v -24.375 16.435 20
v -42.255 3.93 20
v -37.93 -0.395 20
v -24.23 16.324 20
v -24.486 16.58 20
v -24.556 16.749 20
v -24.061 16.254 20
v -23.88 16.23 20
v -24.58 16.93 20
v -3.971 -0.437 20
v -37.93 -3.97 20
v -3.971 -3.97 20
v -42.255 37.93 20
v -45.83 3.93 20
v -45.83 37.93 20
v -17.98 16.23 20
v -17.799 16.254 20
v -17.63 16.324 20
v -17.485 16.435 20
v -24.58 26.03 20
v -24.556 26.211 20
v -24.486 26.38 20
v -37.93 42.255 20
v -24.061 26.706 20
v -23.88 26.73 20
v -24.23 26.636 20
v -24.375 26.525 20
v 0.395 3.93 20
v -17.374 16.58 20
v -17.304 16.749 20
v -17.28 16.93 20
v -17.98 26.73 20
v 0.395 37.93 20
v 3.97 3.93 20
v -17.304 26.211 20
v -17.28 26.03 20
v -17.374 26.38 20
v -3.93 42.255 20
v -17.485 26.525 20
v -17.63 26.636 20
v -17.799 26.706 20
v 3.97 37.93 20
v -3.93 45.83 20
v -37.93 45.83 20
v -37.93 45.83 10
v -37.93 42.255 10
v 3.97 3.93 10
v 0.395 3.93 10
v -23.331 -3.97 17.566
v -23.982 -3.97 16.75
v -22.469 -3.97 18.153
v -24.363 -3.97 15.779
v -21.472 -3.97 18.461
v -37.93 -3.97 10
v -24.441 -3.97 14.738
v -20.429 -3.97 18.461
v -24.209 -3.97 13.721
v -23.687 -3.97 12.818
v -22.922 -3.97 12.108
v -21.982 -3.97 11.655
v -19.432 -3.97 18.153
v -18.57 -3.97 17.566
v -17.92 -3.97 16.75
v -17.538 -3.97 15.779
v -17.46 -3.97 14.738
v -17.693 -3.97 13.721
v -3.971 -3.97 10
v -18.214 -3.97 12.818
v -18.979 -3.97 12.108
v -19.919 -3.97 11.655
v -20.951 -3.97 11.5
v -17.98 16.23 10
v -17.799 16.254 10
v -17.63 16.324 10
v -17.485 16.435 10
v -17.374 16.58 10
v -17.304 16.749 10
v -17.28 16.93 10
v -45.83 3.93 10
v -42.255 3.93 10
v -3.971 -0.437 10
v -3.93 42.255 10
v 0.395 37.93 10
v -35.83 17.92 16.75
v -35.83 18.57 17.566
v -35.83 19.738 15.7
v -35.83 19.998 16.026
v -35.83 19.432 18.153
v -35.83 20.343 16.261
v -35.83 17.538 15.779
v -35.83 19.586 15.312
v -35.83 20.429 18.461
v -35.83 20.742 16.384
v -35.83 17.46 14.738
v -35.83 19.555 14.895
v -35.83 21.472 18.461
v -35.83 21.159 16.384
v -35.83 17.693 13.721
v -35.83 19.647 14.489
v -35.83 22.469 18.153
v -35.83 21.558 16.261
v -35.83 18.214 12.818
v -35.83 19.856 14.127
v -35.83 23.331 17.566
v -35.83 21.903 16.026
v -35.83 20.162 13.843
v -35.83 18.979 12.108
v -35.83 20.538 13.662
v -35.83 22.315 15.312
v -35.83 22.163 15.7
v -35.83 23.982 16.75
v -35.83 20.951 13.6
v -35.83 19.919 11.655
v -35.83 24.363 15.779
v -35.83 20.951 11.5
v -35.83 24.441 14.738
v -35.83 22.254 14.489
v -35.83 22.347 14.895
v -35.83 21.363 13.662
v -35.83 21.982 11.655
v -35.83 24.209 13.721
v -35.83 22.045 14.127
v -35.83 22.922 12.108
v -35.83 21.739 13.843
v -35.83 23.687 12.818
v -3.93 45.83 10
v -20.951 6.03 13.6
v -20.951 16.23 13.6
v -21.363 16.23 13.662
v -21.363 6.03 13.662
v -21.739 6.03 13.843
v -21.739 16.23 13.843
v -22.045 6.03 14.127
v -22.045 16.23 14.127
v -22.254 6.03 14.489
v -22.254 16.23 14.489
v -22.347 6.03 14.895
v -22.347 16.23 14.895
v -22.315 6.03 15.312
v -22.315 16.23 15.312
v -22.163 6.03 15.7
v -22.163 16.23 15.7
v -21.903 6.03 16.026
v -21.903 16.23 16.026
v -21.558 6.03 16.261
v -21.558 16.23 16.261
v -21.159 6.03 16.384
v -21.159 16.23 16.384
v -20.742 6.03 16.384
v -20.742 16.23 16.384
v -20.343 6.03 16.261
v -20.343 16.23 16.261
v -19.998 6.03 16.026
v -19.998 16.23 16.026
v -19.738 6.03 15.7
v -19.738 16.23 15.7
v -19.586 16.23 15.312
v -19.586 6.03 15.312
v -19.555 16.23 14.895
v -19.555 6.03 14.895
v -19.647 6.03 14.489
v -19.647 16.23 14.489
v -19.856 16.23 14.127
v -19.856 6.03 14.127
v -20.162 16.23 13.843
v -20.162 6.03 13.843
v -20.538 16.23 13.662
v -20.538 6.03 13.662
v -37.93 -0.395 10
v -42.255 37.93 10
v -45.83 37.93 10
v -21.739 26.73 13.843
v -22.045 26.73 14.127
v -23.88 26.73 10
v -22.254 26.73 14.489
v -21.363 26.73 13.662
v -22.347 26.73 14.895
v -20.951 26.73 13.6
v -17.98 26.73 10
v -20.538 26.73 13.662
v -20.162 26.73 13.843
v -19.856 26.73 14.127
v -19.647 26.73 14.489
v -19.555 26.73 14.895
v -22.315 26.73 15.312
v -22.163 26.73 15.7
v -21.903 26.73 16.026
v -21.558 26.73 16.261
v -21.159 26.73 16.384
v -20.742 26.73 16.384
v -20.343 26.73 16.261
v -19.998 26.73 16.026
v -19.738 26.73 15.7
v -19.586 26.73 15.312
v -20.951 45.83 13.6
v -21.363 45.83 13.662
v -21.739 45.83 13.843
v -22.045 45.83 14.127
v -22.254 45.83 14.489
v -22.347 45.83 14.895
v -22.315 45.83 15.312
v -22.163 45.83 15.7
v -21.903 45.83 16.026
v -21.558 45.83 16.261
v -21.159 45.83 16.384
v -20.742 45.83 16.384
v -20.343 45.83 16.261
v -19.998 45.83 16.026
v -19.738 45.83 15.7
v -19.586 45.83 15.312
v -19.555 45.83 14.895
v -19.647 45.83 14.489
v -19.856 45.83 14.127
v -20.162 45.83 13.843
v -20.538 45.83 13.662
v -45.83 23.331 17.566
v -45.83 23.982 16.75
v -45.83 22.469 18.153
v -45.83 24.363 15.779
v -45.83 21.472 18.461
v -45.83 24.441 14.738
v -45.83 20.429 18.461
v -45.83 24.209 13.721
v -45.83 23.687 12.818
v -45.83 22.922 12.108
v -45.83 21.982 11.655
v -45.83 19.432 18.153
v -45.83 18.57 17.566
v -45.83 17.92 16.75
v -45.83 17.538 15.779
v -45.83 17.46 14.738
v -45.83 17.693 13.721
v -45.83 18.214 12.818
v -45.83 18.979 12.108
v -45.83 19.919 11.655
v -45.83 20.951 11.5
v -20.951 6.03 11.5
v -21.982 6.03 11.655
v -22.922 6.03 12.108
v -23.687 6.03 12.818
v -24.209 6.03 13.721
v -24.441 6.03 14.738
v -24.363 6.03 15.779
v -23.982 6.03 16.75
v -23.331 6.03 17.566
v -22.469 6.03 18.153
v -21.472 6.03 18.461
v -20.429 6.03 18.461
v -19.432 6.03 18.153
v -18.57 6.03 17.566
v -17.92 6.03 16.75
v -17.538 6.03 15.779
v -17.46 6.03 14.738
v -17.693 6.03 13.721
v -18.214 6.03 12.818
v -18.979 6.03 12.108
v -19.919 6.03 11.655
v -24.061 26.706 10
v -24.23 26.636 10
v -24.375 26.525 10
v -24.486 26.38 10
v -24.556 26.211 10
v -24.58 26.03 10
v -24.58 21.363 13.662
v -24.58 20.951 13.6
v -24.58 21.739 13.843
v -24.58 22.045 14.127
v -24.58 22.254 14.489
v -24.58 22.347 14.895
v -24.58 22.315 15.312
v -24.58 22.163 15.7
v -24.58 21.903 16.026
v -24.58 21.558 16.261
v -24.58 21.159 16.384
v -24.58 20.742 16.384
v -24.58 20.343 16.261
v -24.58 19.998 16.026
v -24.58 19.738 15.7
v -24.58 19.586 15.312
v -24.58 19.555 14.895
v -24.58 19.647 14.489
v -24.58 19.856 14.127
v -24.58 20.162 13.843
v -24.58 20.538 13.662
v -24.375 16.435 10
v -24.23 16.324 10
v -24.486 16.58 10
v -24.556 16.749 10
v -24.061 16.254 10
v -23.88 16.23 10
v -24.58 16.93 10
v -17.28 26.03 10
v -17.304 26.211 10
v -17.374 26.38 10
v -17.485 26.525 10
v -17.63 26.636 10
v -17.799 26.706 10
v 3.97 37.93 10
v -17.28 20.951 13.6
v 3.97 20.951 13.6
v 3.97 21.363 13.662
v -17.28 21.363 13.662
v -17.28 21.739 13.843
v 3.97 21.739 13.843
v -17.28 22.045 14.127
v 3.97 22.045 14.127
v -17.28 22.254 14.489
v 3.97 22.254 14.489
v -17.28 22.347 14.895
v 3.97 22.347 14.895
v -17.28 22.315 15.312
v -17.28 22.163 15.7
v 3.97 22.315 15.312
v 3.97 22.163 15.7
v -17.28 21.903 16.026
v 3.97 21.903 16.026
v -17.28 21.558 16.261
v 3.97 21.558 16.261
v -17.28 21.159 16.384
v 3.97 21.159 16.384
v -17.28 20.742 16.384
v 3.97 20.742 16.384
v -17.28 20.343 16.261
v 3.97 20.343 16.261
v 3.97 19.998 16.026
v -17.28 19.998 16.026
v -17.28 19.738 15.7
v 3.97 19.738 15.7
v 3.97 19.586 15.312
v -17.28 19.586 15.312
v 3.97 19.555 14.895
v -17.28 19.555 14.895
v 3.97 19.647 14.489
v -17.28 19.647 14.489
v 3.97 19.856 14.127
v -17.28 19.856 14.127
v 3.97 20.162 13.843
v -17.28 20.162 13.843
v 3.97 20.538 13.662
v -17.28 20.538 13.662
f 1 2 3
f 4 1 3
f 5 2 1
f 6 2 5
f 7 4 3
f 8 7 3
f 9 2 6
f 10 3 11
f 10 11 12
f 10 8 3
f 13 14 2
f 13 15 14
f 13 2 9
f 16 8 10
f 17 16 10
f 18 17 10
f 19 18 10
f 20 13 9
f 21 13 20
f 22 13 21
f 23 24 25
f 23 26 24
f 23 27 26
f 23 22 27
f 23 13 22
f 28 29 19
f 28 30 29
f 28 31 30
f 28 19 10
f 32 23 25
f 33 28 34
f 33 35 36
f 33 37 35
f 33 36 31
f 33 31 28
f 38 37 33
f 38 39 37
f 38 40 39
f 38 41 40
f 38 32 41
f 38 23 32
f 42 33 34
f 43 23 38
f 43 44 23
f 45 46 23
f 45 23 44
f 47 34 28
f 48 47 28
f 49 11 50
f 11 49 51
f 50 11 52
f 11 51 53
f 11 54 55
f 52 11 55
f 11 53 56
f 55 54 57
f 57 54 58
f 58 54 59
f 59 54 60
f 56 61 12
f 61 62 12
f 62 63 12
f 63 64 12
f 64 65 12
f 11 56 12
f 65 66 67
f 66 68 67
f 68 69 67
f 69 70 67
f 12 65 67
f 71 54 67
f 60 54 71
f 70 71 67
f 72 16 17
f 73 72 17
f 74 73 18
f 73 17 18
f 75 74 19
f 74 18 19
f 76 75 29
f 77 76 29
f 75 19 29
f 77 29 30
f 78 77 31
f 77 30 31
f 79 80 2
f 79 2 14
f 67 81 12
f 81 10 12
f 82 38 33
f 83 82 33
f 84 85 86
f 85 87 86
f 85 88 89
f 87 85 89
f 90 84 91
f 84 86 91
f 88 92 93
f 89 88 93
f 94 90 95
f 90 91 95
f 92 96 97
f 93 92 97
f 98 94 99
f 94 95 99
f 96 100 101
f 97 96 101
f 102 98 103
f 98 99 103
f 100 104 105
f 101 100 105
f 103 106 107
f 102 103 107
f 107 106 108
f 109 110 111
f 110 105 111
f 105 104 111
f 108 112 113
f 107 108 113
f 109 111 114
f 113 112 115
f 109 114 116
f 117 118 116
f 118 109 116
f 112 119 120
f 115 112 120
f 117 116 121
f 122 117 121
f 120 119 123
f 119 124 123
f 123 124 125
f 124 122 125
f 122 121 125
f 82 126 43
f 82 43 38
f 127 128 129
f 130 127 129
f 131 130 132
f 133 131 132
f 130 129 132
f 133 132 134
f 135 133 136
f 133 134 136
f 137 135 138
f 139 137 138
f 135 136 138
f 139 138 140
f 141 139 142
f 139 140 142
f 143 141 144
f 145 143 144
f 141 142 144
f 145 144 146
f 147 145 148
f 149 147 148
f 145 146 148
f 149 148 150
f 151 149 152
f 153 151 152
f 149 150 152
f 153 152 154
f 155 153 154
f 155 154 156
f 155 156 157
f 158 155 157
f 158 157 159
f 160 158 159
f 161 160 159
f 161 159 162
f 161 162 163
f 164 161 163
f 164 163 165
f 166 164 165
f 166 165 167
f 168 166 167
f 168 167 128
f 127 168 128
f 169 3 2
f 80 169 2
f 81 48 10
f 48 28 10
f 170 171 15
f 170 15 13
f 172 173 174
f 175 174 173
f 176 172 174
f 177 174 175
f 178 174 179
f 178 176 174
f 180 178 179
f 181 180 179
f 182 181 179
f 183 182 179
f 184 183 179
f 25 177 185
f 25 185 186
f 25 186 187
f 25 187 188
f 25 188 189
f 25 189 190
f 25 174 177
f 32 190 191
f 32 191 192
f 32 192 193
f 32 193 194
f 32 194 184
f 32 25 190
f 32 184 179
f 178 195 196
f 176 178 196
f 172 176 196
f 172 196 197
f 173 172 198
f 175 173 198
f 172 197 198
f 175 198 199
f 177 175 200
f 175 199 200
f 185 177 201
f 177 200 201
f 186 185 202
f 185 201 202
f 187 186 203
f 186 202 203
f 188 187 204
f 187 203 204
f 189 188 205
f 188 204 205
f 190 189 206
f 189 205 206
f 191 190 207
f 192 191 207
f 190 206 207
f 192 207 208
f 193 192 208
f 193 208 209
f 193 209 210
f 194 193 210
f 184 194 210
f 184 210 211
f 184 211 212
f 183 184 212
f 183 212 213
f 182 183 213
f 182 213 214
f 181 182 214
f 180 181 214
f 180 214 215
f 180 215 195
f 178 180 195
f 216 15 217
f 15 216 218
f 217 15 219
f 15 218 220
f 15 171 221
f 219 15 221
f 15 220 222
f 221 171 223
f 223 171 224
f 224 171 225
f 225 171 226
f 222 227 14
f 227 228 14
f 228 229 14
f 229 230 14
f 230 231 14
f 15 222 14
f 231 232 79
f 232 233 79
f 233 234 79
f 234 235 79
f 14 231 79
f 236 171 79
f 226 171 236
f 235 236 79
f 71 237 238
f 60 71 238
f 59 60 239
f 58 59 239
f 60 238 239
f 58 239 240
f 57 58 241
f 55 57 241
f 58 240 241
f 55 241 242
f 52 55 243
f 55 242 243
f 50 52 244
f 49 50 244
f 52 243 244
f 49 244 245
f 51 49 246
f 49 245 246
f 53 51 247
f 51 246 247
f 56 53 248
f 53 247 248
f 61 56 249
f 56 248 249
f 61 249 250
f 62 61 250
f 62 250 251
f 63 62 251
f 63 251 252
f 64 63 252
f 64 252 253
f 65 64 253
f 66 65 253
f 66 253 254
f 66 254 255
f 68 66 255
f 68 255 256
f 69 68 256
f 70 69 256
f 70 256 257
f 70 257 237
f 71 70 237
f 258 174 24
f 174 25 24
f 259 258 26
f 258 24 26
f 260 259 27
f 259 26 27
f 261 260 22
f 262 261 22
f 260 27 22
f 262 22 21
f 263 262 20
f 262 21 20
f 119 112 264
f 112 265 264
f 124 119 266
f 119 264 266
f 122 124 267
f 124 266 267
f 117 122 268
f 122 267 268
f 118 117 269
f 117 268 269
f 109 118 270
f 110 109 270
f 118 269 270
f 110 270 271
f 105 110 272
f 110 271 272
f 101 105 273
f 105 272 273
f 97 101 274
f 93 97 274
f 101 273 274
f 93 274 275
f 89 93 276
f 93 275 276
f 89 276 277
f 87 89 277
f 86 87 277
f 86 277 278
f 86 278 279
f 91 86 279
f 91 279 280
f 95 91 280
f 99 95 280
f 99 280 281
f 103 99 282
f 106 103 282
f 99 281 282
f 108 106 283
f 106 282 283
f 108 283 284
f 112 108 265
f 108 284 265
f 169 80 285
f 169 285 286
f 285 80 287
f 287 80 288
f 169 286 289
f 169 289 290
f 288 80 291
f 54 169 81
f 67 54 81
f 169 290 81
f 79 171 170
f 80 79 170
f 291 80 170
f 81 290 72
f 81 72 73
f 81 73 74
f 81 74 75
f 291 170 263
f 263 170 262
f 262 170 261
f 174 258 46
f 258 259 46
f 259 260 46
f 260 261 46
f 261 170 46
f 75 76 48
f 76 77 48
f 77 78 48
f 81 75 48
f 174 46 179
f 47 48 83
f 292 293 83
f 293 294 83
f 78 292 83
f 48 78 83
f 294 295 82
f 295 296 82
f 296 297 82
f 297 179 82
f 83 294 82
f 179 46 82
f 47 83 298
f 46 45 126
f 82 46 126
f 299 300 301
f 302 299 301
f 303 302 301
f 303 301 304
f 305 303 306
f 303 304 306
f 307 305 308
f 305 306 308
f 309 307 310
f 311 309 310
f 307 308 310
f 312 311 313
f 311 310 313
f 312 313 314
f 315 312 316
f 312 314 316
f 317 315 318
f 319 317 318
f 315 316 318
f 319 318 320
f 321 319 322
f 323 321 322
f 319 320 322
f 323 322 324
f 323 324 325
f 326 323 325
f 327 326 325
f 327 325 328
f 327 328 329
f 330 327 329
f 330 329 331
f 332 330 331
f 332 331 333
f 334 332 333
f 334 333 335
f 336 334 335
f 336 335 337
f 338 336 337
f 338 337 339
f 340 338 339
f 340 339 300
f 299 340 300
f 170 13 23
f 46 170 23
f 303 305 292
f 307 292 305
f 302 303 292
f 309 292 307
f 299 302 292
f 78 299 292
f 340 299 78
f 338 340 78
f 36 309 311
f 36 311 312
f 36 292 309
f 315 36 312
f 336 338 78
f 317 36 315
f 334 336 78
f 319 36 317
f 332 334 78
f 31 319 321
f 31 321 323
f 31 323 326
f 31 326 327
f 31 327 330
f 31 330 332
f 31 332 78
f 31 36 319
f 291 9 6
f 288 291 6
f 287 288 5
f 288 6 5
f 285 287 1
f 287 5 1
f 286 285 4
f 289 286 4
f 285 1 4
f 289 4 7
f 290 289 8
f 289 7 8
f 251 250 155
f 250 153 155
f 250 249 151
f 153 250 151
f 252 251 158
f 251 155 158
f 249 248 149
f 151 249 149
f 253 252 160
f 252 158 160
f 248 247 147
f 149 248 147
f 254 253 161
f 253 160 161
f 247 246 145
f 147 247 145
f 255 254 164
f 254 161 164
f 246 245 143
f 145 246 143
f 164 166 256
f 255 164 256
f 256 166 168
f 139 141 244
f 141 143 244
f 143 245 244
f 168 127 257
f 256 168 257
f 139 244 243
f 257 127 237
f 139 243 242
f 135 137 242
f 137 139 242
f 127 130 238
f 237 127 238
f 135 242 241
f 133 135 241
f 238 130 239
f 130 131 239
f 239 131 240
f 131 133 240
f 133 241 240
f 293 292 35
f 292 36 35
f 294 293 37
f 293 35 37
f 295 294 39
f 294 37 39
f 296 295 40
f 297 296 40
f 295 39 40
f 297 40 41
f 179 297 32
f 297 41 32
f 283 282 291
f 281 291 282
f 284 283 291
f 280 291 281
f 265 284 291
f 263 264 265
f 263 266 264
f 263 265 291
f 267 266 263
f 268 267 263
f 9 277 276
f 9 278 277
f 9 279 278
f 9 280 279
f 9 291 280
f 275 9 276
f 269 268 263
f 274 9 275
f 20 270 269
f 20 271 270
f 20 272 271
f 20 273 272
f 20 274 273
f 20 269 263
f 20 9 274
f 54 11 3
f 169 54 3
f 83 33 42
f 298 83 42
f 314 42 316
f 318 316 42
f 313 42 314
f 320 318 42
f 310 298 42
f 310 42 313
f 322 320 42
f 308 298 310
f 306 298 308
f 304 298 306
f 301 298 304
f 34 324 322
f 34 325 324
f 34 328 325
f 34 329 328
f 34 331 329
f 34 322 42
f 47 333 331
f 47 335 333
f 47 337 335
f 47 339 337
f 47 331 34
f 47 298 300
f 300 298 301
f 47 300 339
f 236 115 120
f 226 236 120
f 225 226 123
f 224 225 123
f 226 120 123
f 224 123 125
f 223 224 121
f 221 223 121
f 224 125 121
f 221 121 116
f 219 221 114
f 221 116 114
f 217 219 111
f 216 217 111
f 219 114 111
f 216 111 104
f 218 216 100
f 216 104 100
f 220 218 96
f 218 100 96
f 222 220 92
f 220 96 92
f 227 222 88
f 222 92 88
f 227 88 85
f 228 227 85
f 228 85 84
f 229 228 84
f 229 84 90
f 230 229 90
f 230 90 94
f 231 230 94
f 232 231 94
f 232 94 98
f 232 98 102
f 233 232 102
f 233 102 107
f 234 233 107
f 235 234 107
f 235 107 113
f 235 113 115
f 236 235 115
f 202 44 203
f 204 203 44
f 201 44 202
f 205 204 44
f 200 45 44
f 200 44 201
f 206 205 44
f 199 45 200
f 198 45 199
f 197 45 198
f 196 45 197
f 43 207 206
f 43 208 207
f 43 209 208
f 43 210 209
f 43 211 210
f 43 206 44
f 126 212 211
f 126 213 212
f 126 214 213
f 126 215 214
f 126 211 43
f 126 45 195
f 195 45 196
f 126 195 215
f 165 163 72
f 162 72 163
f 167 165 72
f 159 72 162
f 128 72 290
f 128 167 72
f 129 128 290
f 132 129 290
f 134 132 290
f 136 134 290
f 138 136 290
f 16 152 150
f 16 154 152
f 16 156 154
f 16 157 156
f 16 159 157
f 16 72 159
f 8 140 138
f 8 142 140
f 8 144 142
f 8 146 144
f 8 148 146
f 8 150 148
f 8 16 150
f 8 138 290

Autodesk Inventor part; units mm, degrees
ref_plane "YZ Plane" through (0, 0, 0) normal (1, 0, 0) x (0, 1, 0)
ref_plane "XZ Plane" through (0, 0, 0) normal (0, 1, 0) x (-1, 0, 0)
ref_plane "Work Plane1" through (0, 0, 10) normal (0, 0, 1) x (1, 0, 0)
sketch "Sketch1" plane through (0, 0, 10) normal (0, 0, 1) x (1, 0, 0)
  line L0 (-4.0299, -0.3538) -> (-2.2322, 1.4439) construction
  arc A0 (-1.4439, 2.2322) -> (-2.2322, 1.4439) centre (-0.9299, 0.9299) ccw construction
  line L1 (-1.4439, 2.2322) -> (0.3538, 4.0299) construction
  line L2 (-37.8299, 42.8299) -> (-37.8299, 37.8299) construction
  line L3 (-37.8299, 37.8299) -> (-42.9208, 37.8299) construction
  line L4 (-37.8299, 42.2137) -> (-37.8299, 45.8299) construction
  line L5 (-37.8299, 45.8299) -> (-4.0299, 45.8299) construction
  line L6 (-4.0299, 45.8299) -> (-4.0299, 42.2137) construction
  line L7 (-4.0299, 4.0299) -> (0.3538, 4.0299) projected
  circle A1 centre (-20.9299, 20.9299) radius 17.5 projected
  line L8 (-20.9299, 58.9723) -> (17.1124, 20.9299) construction
  line L9 (17.1124, 20.9299) -> (-20.9299, -17.1124) construction
  line L10 (-20.9299, -17.1124) -> (-58.9723, 20.9299) construction
  line L11 (-58.9723, 20.9299) -> (-20.9299, 58.9723) construction
  line L12 (-20.9299, 58.9723) -> (-20.9299, -17.1124) construction
  line L13 (17.1124, 20.9299) -> (-58.9723, 20.9299) construction
  line L14 (-20.9299, 58.9723) -> (32.8701, 58.9723) construction
  line L15 (-43.4299, 43.4299) -> (1.5701, 43.4299) construction
  line L16 (1.5701, 43.4299) -> (1.5701, -1.5701) construction
  line L17 (1.5701, -1.5701) -> (-43.4299, -1.5701) construction
  line L18 (-43.4299, -1.5701) -> (-43.4299, 43.4299) construction
  line L19 (-43.4299, 43.4299) -> (1.5701, -1.5701) construction
  line L20 (1.5701, 43.4299) -> (-43.4299, -1.5701) construction
  line L21 (-43.4299, 5.3876) -> (-43.4299, 36.4723)
  line L22 (-43.4299, 36.4723) -> (-36.4723, 43.4299)
  line L23 (-36.4723, 43.4299) -> (-5.3876, 43.4299)
  line L24 (-5.3876, 43.4299) -> (1.5701, 36.4723)
  line L25 (1.5701, 36.4723) -> (1.5701, 5.3876)
  line L26 (1.5701, 5.3876) -> (-5.3876, -1.5701)
  line L27 (-5.3876, -1.5701) -> (-36.4723, -1.5701)
  line L28 (-36.4723, -1.5701) -> (-43.4299, 5.3876)
  line L29 (-4.0299, 42.2137) -> (-37.8299, 42.2137) projected
  line L30 (-4.0299, -0.3538) -> (-4.0299, 4.0299) projected
  circle A2 centre (-20.9299, 20.9299) radius 1.5
  line L31 (-10.9299, 10.9299) -> (-30.9299, 10.9299) construction
  line L32 (-30.9299, 10.9299) -> (-30.9299, 30.9299) construction
  line L33 (-30.9299, 30.9299) -> (-10.9299, 30.9299) construction
  line L34 (-10.9299, 30.9299) -> (-10.9299, 10.9299) construction
  line L35 (-10.9299, 10.9299) -> (-30.9299, 30.9299) construction
  line L36 (-30.9299, 10.9299) -> (-10.9299, 30.9299) construction
  circle A3 centre (-30.9299, 30.9299) radius 1.4
  circle A4 centre (-30.9299, 10.9299) radius 1.4
  circle A5 centre (-10.9299, 10.9299) radius 1.4
  line L37 (-45.8299, 37.8299) -> (-42.0723, 37.8299) construction
  line L38 (-42.1723, 37.7299) -> (-45.8299, 37.7299)
  line L39 (-45.8299, 37.7299) -> (-45.8299, 4.1299)
  line L40 (-45.8299, 4.1299) -> (-42.1723, 4.1299)
  line L41 (-42.1723, 4.1299) -> (-42.1723, 37.7299)
  line L42 (-45.8299, 4.0299) -> (-42.0723, 4.0299) construction
  line L43 (-45.8299, 37.8299) -> (-42.0723, 37.8299) projected
  line L44 (-37.7299, 45.8299) -> (-4.1299, 45.8299)
  line L45 (-4.1299, 45.8299) -> (-4.1299, 42.1723)
  line L46 (-4.1299, 42.1723) -> (-37.7299, 42.1723)
  line L47 (-37.7299, 42.1723) -> (-37.7299, 45.8299)
  line L48 (0.4701, 37.8299) -> (0.4701, 4.0299) construction
  line L49 (0.4701, 4.0299) -> (3.9701, 4.0299) construction
  line L50 (3.9701, 37.8299) -> (3.9701, 4.0299) construction
  line L51 (0.4701, 37.8299) -> (3.9701, 37.8299) construction
  line L52 (-45.8299, -3.9701) -> (-4.0299, -3.9701) construction
  line L53 (0.3124, 37.7299) -> (3.9701, 37.7299)
  line L54 (3.9701, 37.7299) -> (3.9701, 4.1299)
  line L55 (3.9701, 4.1299) -> (0.3124, 4.1299)
  line L56 (0.3124, 4.1299) -> (0.3124, 37.7299)
  line L57 (-4.1713, -0.3538) -> (-37.7299, -0.3538)
  line L58 (-37.7299, -0.3538) -> (-37.7299, -3.9701)
  line L59 (-37.7299, -3.9701) -> (-4.1713, -3.9701)
  line L60 (-4.1713, -3.9701) -> (-4.1713, -0.3538)
  point P0 (-37.8299, 4.0299)
  dimension "d18" = 53.8
  dimension "d19" = 45
  dimension "d20" = 53.8
  dimension "d21" = 45
  dimension "d22" = 45
  dimension "d30" = 20
  dimension "d31" = 20
  dimension "d32" = 2.8
  dimension "d33" = 2.8
  dimension "d34" = 2.8
  dimension "d35" = 3
  dimension "d36" = 0.1
  dimension "d37" = 0.1
  dimension "d38" = 0.1
  dimension "d39" = 0.1
extrude "Extrusion1" add sketch "Sketch1" along normal blind 10 contours L30 L26 L57 L28 L41 L22 L46 L24 L56 L7 | L7 L26 L30 | L56 L24 L25 L26 | L26 L25 L24 L53 L54 L55 | L60 L59 L58 L57 L28 L27 L26 | L26 L27 L28 L57 | L46 L22 L29 L24 | L24 L29 L45 | L40 L39 L38 L22 L21 L28 | L28 L21 L22 L41 | L29 L22 L23 L24 | L24 L23 L22 L29 L47 L44 L45 | L47 L29 L22 | A1 | A2 | A3 | A4 | A5
sketch "Skizze4" plane through (0, 0, 20) normal (0, 0, 1) x (1, 0, 0)
  line L0 (-37.7299, 42.1723) -> (-42.1723, 37.7299) projected
  line L1 (-42.1723, 37.7299) -> (-45.8299, 37.7299) projected
  line L2 (-45.8299, 37.7299) -> (-45.8299, 4.1299) construction
  line L3 (-45.8299, 4.1299) -> (-42.1723, 4.1299) projected
  line L4 (-42.1723, 4.1299) -> (-37.6885, -0.3538) projected
  line L5 (-37.6885, -0.3538) -> (-37.7299, -0.3538) projected
  line L6 (-37.7299, -0.3538) -> (-37.7299, -3.9701) projected
  line L7 (-37.7299, -3.9701) -> (-4.1713, -3.9701) construction
  line L8 (-4.1713, -3.9701) -> (-4.1713, -0.3538) projected
  line L9 (-4.1713, -0.3538) -> (0.3124, 4.1299) projected
  line L10 (0.3124, 4.1299) -> (3.9701, 4.1299) projected
  line L11 (3.9701, 4.1299) -> (3.9701, 37.7299) construction
  line L12 (3.9701, 37.7299) -> (0.3124, 37.7299) projected
  line L13 (0.3124, 37.7299) -> (-4.1299, 42.1723) projected
  line L14 (-4.1299, 42.1723) -> (-4.1299, 45.8299) projected
  line L15 (-4.1299, 45.8299) -> (-37.7299, 45.8299) construction
  line L16 (-37.7299, 45.8299) -> (-37.7299, 42.1723) projected
  line L17 (-37.9299, 46.0299) -> (-3.9299, 46.0299) construction
  line L18 (-3.9299, 46.0299) -> (-3.9299, 42.2551)
  line L19 (-3.9299, 42.2551) -> (0.3953, 37.9299)
  line L20 (0.3953, 37.9299) -> (4.1701, 37.9299)
  line L21 (4.1701, 37.9299) -> (4.1701, 3.9299) construction
  line L22 (4.1701, 3.9299) -> (0.3953, 3.9299)
  line L23 (0.3953, 3.9299) -> (-3.9713, -0.4367)
  line L24 (-3.9713, -0.4367) -> (-3.9713, -4.1701)
  line L25 (-3.9713, -4.1701) -> (-37.9299, -4.1701) construction
  line L26 (-37.9299, -4.1701) -> (-37.9299, -0.3953)
  line L27 (-37.9299, -0.3953) -> (-42.2551, 3.9299)
  line L28 (-42.2551, 3.9299) -> (-46.0299, 3.9299)
  line L29 (-46.0299, 3.9299) -> (-46.0299, 37.9299) construction
  line L30 (-46.0299, 37.9299) -> (-42.2551, 37.9299)
  line L31 (-42.2551, 37.9299) -> (-37.9299, 42.2551)
  line L32 (-37.9299, 42.2551) -> (-37.9299, 46.0299)
  line L33 (-45.8299, 37.7299) -> (-45.8299, 37.9299)
  line L34 (-4.1299, 45.8299) -> (-37.7299, 45.8299) projected
  line L35 (-37.7299, 45.8299) -> (-37.9299, 45.8299)
  line L36 (-4.1299, 45.8299) -> (-3.9299, 45.8299)
  line L37 (3.9701, 37.7299) -> (3.9701, 37.9299)
  line L38 (3.9701, 4.1299) -> (3.9701, 37.7299) projected
  line L39 (3.9701, 4.1299) -> (3.9701, 3.9299)
  line L40 (-4.1713, -3.9701) -> (-3.9713, -3.9701)
  line L41 (-37.7299, -3.9701) -> (-37.9299, -3.9701)
  line L42 (-45.8299, 4.1299) -> (-45.8299, 3.9299)
  point P0 (0, 0)
  dimension "d40" = 0.2
extrude "IM_offset" add sketch "Skizze4" against normal up to surface (10 mm away)
sketch "Sketch25" plane through (0, 0, 10) normal (0, 0, -1) x (-1, 0, 0)
  line L0 (3.9713, -3.9701) -> (37.9299, -3.9701) projected
  line L1 (37.9299, -3.9701) -> (37.9299, -0.3953) projected
  line L2 (37.9299, -0.3953) -> (42.2551, 3.9299) projected
  line L3 (42.2551, 3.9299) -> (45.8299, 3.9299) projected
  line L4 (45.8299, 3.9299) -> (45.8299, 37.9299) projected
  line L5 (45.8299, 37.9299) -> (42.2551, 37.9299) projected
  line L6 (42.2551, 37.9299) -> (37.9299, 42.2551) projected
  line L7 (37.9299, 42.2551) -> (37.9299, 45.8299) projected
  line L8 (37.9299, 45.8299) -> (3.9299, 45.8299) projected
  line L9 (3.9299, 45.8299) -> (3.9299, 42.2551) projected
  line L10 (3.9299, 42.2551) -> (-0.3953, 37.9299) projected
  line L11 (-0.3953, 37.9299) -> (-3.9701, 37.9299) projected
  line L12 (-3.9701, 37.9299) -> (-3.9701, 3.9299) projected
  line L13 (-3.9701, 3.9299) -> (-0.3953, 3.9299) projected
  line L14 (-0.3953, 3.9299) -> (3.9713, -0.4367) projected
  line L15 (3.9713, -0.4367) -> (3.9713, -3.9701) projected
  circle A0 centre (20.9299, 20.9299) radius 24.9
  circle A1 centre (20.9299, 20.9299) radius 1.5
  dimension "d167" = 3
extrude "Extrusion21" cut sketch "Sketch25" against normal through all contours A1
sketch "Sketch26" plane through (-37.9299, -3.9701, 10) normal (0, -1, 0) x (1, 0, 0)
  line L0 (8.25, 4.8) -> (8.25, 11.5)
  line L1 (10.75, 4.8) -> (10.75, 11.5)
  circle A0 centre (16.9793, 5) radius 1.4
  line L2 (33.9586, 10) -> (0, 10) projected
  point P0 (37.9299, -10)
  dimension "d155" = 2.8
  dimension "d156" = 5
hole "Hole1" at (-20.9506, -3.9701, 15) direction (0, 1, 0) diameter 2.8 end through all counterbore diameter 7 counterbore depth 10
pattern_circular "Circular Pattern1" count 2 over 90 about axis through (-20.9299, 20.9299, 10) along (0, 0, -1) of "Hole1", "Extrusion21"
sketch "Sketch27" plane through (0, 0, 20) normal (0, 0, 1) x (1, 0, 0)
  line L0 (-3.9299, 45.8299) -> (-37.9299, 45.8299) projected
  line L1 (-37.9299, 45.8299) -> (-37.9299, 42.2551) projected
  line L2 (-37.9299, 42.2551) -> (-42.2551, 37.9299) projected
  line L3 (-42.2551, 37.9299) -> (-45.8299, 37.9299) projected
  line L4 (-45.8299, 37.9299) -> (-45.8299, 3.9299) projected
  line L5 (-42.2551, 3.9299) -> (-45.8299, 3.9299) projected
  line L6 (-37.9299, -0.3953) -> (-42.2551, 3.9299) projected
  line L7 (-37.9299, -3.9701) -> (-37.9299, -0.3953) projected
  line L8 (-3.9713, -3.9701) -> (-37.9299, -3.9701) projected
  line L9 (-3.9713, -3.9701) -> (-3.9713, -0.4367) projected
  line L10 (-3.9713, -0.4367) -> (0.3953, 3.9299) projected
  line L11 (0.3953, 3.9299) -> (3.9701, 3.9299) projected
  line L12 (3.9701, 3.9299) -> (3.9701, 37.9299) projected
  line L13 (3.9701, 37.9299) -> (0.3953, 37.9299) projected
  line L14 (0.3953, 37.9299) -> (-3.9299, 42.2551) projected
  line L15 (-3.9299, 42.2551) -> (-3.9299, 45.8299) projected
  circle A0 centre (-20.9299, 20.9299) radius 24.9
  point P0 (0, 0)
sketch "Sketch28" plane through (0, 0, 20) normal (0, 0, 1) x (1, 0, 0)
  line L0 (-24.3799, 26.0299) -> (-24.3799, 16.9299) projected
  arc A0 (-24.3799, 16.9299) -> (-23.8799, 16.4299) centre (-23.8799, 16.9299) ccw projected
  line L1 (-23.8799, 16.4299) -> (-17.9799, 16.4299) projected
  arc A1 (-17.9799, 16.4299) -> (-17.4799, 16.9299) centre (-17.9799, 16.9299) ccw projected
  line L2 (-17.4799, 16.9299) -> (-17.4799, 26.0299) projected
  arc A2 (-17.4799, 26.0299) -> (-17.9799, 26.5299) centre (-17.9799, 26.0299) ccw projected
  line L3 (-17.9799, 26.5299) -> (-23.8799, 26.5299) projected
  arc A3 (-23.8799, 26.5299) -> (-24.3799, 26.0299) centre (-23.8799, 26.0299) ccw projected
  line L4 (-21.7799, 18.2799) -> (-21.7799, 17.7299) projected
  line L5 (-23.2299, 18.2799) -> (-21.7799, 18.2799) projected
  line L6 (-23.2299, 22.8799) -> (-23.2299, 18.2799) projected
  line L7 (-22.5799, 22.8799) -> (-23.2299, 22.8799) projected
  line L8 (-22.5799, 23.6799) -> (-22.5799, 22.8799) projected
  line L9 (-23.2299, 23.6799) -> (-22.5799, 23.6799) projected
  line L10 (-23.2299, 24.7799) -> (-23.2299, 23.6799) projected
  line L11 (-22.2299, 24.7799) -> (-23.2299, 24.7799) projected
  line L12 (-22.2299, 25.7799) -> (-22.2299, 24.7799) projected
  line L13 (-19.6299, 25.7799) -> (-22.2299, 25.7799) projected
  line L14 (-19.6299, 24.7799) -> (-19.6299, 25.7799) projected
  line L15 (-18.6299, 24.7799) -> (-19.6299, 24.7799) projected
  line L16 (-18.6299, 23.6799) -> (-18.6299, 24.7799) projected
  line L17 (-19.2799, 23.6799) -> (-18.6299, 23.6799) projected
  line L18 (-19.2799, 22.8799) -> (-19.2799, 23.6799) projected
  line L19 (-18.6299, 22.8799) -> (-19.2799, 22.8799) projected
  line L20 (-18.6299, 18.2799) -> (-18.6299, 22.8799) projected
  line L21 (-20.0799, 18.2799) -> (-18.6299, 18.2799) projected
  line L22 (-20.0799, 17.7299) -> (-20.0799, 18.2799) projected
  line L23 (-21.7799, 17.7299) -> (-20.0799, 17.7299) projected
  line L24 (-24.5799, 16.9299) -> (-24.5799, 26.0299)
  arc A4 (-23.8799, 26.7299) -> (-24.5799, 26.0299) centre (-23.8799, 26.0299) ccw
  line L25 (-23.8799, 26.7299) -> (-17.9799, 26.7299)
  arc A5 (-17.2799, 26.0299) -> (-17.9799, 26.7299) centre (-17.9799, 26.0299) ccw
  line L26 (-17.2799, 26.0299) -> (-17.2799, 16.9299)
  arc A6 (-17.9799, 16.2299) -> (-17.2799, 16.9299) centre (-17.9799, 16.9299) ccw
  line L27 (-17.9799, 16.2299) -> (-23.8799, 16.2299)
  arc A7 (-24.5799, 16.9299) -> (-23.8799, 16.2299) centre (-23.8799, 16.9299) ccw
  point P0 (0, 0)
  dimension "d168" = 0.2
extrude "Extrusion22" cut sketch "Sketch28" against normal blind 10 contours A3 L3 A2 L2 A1 L1 A0 L0 | L5 L6 L7 L8 L9 L10 L11 L12 L13 L14 L15 L16 L17 L18 L19 L20 L21 L22 L23 L4 | L24 A4 L25 A5 L26 A6 L27 A7
properties part number "20_Cube_Insert_Fiber_STMount_Center"
